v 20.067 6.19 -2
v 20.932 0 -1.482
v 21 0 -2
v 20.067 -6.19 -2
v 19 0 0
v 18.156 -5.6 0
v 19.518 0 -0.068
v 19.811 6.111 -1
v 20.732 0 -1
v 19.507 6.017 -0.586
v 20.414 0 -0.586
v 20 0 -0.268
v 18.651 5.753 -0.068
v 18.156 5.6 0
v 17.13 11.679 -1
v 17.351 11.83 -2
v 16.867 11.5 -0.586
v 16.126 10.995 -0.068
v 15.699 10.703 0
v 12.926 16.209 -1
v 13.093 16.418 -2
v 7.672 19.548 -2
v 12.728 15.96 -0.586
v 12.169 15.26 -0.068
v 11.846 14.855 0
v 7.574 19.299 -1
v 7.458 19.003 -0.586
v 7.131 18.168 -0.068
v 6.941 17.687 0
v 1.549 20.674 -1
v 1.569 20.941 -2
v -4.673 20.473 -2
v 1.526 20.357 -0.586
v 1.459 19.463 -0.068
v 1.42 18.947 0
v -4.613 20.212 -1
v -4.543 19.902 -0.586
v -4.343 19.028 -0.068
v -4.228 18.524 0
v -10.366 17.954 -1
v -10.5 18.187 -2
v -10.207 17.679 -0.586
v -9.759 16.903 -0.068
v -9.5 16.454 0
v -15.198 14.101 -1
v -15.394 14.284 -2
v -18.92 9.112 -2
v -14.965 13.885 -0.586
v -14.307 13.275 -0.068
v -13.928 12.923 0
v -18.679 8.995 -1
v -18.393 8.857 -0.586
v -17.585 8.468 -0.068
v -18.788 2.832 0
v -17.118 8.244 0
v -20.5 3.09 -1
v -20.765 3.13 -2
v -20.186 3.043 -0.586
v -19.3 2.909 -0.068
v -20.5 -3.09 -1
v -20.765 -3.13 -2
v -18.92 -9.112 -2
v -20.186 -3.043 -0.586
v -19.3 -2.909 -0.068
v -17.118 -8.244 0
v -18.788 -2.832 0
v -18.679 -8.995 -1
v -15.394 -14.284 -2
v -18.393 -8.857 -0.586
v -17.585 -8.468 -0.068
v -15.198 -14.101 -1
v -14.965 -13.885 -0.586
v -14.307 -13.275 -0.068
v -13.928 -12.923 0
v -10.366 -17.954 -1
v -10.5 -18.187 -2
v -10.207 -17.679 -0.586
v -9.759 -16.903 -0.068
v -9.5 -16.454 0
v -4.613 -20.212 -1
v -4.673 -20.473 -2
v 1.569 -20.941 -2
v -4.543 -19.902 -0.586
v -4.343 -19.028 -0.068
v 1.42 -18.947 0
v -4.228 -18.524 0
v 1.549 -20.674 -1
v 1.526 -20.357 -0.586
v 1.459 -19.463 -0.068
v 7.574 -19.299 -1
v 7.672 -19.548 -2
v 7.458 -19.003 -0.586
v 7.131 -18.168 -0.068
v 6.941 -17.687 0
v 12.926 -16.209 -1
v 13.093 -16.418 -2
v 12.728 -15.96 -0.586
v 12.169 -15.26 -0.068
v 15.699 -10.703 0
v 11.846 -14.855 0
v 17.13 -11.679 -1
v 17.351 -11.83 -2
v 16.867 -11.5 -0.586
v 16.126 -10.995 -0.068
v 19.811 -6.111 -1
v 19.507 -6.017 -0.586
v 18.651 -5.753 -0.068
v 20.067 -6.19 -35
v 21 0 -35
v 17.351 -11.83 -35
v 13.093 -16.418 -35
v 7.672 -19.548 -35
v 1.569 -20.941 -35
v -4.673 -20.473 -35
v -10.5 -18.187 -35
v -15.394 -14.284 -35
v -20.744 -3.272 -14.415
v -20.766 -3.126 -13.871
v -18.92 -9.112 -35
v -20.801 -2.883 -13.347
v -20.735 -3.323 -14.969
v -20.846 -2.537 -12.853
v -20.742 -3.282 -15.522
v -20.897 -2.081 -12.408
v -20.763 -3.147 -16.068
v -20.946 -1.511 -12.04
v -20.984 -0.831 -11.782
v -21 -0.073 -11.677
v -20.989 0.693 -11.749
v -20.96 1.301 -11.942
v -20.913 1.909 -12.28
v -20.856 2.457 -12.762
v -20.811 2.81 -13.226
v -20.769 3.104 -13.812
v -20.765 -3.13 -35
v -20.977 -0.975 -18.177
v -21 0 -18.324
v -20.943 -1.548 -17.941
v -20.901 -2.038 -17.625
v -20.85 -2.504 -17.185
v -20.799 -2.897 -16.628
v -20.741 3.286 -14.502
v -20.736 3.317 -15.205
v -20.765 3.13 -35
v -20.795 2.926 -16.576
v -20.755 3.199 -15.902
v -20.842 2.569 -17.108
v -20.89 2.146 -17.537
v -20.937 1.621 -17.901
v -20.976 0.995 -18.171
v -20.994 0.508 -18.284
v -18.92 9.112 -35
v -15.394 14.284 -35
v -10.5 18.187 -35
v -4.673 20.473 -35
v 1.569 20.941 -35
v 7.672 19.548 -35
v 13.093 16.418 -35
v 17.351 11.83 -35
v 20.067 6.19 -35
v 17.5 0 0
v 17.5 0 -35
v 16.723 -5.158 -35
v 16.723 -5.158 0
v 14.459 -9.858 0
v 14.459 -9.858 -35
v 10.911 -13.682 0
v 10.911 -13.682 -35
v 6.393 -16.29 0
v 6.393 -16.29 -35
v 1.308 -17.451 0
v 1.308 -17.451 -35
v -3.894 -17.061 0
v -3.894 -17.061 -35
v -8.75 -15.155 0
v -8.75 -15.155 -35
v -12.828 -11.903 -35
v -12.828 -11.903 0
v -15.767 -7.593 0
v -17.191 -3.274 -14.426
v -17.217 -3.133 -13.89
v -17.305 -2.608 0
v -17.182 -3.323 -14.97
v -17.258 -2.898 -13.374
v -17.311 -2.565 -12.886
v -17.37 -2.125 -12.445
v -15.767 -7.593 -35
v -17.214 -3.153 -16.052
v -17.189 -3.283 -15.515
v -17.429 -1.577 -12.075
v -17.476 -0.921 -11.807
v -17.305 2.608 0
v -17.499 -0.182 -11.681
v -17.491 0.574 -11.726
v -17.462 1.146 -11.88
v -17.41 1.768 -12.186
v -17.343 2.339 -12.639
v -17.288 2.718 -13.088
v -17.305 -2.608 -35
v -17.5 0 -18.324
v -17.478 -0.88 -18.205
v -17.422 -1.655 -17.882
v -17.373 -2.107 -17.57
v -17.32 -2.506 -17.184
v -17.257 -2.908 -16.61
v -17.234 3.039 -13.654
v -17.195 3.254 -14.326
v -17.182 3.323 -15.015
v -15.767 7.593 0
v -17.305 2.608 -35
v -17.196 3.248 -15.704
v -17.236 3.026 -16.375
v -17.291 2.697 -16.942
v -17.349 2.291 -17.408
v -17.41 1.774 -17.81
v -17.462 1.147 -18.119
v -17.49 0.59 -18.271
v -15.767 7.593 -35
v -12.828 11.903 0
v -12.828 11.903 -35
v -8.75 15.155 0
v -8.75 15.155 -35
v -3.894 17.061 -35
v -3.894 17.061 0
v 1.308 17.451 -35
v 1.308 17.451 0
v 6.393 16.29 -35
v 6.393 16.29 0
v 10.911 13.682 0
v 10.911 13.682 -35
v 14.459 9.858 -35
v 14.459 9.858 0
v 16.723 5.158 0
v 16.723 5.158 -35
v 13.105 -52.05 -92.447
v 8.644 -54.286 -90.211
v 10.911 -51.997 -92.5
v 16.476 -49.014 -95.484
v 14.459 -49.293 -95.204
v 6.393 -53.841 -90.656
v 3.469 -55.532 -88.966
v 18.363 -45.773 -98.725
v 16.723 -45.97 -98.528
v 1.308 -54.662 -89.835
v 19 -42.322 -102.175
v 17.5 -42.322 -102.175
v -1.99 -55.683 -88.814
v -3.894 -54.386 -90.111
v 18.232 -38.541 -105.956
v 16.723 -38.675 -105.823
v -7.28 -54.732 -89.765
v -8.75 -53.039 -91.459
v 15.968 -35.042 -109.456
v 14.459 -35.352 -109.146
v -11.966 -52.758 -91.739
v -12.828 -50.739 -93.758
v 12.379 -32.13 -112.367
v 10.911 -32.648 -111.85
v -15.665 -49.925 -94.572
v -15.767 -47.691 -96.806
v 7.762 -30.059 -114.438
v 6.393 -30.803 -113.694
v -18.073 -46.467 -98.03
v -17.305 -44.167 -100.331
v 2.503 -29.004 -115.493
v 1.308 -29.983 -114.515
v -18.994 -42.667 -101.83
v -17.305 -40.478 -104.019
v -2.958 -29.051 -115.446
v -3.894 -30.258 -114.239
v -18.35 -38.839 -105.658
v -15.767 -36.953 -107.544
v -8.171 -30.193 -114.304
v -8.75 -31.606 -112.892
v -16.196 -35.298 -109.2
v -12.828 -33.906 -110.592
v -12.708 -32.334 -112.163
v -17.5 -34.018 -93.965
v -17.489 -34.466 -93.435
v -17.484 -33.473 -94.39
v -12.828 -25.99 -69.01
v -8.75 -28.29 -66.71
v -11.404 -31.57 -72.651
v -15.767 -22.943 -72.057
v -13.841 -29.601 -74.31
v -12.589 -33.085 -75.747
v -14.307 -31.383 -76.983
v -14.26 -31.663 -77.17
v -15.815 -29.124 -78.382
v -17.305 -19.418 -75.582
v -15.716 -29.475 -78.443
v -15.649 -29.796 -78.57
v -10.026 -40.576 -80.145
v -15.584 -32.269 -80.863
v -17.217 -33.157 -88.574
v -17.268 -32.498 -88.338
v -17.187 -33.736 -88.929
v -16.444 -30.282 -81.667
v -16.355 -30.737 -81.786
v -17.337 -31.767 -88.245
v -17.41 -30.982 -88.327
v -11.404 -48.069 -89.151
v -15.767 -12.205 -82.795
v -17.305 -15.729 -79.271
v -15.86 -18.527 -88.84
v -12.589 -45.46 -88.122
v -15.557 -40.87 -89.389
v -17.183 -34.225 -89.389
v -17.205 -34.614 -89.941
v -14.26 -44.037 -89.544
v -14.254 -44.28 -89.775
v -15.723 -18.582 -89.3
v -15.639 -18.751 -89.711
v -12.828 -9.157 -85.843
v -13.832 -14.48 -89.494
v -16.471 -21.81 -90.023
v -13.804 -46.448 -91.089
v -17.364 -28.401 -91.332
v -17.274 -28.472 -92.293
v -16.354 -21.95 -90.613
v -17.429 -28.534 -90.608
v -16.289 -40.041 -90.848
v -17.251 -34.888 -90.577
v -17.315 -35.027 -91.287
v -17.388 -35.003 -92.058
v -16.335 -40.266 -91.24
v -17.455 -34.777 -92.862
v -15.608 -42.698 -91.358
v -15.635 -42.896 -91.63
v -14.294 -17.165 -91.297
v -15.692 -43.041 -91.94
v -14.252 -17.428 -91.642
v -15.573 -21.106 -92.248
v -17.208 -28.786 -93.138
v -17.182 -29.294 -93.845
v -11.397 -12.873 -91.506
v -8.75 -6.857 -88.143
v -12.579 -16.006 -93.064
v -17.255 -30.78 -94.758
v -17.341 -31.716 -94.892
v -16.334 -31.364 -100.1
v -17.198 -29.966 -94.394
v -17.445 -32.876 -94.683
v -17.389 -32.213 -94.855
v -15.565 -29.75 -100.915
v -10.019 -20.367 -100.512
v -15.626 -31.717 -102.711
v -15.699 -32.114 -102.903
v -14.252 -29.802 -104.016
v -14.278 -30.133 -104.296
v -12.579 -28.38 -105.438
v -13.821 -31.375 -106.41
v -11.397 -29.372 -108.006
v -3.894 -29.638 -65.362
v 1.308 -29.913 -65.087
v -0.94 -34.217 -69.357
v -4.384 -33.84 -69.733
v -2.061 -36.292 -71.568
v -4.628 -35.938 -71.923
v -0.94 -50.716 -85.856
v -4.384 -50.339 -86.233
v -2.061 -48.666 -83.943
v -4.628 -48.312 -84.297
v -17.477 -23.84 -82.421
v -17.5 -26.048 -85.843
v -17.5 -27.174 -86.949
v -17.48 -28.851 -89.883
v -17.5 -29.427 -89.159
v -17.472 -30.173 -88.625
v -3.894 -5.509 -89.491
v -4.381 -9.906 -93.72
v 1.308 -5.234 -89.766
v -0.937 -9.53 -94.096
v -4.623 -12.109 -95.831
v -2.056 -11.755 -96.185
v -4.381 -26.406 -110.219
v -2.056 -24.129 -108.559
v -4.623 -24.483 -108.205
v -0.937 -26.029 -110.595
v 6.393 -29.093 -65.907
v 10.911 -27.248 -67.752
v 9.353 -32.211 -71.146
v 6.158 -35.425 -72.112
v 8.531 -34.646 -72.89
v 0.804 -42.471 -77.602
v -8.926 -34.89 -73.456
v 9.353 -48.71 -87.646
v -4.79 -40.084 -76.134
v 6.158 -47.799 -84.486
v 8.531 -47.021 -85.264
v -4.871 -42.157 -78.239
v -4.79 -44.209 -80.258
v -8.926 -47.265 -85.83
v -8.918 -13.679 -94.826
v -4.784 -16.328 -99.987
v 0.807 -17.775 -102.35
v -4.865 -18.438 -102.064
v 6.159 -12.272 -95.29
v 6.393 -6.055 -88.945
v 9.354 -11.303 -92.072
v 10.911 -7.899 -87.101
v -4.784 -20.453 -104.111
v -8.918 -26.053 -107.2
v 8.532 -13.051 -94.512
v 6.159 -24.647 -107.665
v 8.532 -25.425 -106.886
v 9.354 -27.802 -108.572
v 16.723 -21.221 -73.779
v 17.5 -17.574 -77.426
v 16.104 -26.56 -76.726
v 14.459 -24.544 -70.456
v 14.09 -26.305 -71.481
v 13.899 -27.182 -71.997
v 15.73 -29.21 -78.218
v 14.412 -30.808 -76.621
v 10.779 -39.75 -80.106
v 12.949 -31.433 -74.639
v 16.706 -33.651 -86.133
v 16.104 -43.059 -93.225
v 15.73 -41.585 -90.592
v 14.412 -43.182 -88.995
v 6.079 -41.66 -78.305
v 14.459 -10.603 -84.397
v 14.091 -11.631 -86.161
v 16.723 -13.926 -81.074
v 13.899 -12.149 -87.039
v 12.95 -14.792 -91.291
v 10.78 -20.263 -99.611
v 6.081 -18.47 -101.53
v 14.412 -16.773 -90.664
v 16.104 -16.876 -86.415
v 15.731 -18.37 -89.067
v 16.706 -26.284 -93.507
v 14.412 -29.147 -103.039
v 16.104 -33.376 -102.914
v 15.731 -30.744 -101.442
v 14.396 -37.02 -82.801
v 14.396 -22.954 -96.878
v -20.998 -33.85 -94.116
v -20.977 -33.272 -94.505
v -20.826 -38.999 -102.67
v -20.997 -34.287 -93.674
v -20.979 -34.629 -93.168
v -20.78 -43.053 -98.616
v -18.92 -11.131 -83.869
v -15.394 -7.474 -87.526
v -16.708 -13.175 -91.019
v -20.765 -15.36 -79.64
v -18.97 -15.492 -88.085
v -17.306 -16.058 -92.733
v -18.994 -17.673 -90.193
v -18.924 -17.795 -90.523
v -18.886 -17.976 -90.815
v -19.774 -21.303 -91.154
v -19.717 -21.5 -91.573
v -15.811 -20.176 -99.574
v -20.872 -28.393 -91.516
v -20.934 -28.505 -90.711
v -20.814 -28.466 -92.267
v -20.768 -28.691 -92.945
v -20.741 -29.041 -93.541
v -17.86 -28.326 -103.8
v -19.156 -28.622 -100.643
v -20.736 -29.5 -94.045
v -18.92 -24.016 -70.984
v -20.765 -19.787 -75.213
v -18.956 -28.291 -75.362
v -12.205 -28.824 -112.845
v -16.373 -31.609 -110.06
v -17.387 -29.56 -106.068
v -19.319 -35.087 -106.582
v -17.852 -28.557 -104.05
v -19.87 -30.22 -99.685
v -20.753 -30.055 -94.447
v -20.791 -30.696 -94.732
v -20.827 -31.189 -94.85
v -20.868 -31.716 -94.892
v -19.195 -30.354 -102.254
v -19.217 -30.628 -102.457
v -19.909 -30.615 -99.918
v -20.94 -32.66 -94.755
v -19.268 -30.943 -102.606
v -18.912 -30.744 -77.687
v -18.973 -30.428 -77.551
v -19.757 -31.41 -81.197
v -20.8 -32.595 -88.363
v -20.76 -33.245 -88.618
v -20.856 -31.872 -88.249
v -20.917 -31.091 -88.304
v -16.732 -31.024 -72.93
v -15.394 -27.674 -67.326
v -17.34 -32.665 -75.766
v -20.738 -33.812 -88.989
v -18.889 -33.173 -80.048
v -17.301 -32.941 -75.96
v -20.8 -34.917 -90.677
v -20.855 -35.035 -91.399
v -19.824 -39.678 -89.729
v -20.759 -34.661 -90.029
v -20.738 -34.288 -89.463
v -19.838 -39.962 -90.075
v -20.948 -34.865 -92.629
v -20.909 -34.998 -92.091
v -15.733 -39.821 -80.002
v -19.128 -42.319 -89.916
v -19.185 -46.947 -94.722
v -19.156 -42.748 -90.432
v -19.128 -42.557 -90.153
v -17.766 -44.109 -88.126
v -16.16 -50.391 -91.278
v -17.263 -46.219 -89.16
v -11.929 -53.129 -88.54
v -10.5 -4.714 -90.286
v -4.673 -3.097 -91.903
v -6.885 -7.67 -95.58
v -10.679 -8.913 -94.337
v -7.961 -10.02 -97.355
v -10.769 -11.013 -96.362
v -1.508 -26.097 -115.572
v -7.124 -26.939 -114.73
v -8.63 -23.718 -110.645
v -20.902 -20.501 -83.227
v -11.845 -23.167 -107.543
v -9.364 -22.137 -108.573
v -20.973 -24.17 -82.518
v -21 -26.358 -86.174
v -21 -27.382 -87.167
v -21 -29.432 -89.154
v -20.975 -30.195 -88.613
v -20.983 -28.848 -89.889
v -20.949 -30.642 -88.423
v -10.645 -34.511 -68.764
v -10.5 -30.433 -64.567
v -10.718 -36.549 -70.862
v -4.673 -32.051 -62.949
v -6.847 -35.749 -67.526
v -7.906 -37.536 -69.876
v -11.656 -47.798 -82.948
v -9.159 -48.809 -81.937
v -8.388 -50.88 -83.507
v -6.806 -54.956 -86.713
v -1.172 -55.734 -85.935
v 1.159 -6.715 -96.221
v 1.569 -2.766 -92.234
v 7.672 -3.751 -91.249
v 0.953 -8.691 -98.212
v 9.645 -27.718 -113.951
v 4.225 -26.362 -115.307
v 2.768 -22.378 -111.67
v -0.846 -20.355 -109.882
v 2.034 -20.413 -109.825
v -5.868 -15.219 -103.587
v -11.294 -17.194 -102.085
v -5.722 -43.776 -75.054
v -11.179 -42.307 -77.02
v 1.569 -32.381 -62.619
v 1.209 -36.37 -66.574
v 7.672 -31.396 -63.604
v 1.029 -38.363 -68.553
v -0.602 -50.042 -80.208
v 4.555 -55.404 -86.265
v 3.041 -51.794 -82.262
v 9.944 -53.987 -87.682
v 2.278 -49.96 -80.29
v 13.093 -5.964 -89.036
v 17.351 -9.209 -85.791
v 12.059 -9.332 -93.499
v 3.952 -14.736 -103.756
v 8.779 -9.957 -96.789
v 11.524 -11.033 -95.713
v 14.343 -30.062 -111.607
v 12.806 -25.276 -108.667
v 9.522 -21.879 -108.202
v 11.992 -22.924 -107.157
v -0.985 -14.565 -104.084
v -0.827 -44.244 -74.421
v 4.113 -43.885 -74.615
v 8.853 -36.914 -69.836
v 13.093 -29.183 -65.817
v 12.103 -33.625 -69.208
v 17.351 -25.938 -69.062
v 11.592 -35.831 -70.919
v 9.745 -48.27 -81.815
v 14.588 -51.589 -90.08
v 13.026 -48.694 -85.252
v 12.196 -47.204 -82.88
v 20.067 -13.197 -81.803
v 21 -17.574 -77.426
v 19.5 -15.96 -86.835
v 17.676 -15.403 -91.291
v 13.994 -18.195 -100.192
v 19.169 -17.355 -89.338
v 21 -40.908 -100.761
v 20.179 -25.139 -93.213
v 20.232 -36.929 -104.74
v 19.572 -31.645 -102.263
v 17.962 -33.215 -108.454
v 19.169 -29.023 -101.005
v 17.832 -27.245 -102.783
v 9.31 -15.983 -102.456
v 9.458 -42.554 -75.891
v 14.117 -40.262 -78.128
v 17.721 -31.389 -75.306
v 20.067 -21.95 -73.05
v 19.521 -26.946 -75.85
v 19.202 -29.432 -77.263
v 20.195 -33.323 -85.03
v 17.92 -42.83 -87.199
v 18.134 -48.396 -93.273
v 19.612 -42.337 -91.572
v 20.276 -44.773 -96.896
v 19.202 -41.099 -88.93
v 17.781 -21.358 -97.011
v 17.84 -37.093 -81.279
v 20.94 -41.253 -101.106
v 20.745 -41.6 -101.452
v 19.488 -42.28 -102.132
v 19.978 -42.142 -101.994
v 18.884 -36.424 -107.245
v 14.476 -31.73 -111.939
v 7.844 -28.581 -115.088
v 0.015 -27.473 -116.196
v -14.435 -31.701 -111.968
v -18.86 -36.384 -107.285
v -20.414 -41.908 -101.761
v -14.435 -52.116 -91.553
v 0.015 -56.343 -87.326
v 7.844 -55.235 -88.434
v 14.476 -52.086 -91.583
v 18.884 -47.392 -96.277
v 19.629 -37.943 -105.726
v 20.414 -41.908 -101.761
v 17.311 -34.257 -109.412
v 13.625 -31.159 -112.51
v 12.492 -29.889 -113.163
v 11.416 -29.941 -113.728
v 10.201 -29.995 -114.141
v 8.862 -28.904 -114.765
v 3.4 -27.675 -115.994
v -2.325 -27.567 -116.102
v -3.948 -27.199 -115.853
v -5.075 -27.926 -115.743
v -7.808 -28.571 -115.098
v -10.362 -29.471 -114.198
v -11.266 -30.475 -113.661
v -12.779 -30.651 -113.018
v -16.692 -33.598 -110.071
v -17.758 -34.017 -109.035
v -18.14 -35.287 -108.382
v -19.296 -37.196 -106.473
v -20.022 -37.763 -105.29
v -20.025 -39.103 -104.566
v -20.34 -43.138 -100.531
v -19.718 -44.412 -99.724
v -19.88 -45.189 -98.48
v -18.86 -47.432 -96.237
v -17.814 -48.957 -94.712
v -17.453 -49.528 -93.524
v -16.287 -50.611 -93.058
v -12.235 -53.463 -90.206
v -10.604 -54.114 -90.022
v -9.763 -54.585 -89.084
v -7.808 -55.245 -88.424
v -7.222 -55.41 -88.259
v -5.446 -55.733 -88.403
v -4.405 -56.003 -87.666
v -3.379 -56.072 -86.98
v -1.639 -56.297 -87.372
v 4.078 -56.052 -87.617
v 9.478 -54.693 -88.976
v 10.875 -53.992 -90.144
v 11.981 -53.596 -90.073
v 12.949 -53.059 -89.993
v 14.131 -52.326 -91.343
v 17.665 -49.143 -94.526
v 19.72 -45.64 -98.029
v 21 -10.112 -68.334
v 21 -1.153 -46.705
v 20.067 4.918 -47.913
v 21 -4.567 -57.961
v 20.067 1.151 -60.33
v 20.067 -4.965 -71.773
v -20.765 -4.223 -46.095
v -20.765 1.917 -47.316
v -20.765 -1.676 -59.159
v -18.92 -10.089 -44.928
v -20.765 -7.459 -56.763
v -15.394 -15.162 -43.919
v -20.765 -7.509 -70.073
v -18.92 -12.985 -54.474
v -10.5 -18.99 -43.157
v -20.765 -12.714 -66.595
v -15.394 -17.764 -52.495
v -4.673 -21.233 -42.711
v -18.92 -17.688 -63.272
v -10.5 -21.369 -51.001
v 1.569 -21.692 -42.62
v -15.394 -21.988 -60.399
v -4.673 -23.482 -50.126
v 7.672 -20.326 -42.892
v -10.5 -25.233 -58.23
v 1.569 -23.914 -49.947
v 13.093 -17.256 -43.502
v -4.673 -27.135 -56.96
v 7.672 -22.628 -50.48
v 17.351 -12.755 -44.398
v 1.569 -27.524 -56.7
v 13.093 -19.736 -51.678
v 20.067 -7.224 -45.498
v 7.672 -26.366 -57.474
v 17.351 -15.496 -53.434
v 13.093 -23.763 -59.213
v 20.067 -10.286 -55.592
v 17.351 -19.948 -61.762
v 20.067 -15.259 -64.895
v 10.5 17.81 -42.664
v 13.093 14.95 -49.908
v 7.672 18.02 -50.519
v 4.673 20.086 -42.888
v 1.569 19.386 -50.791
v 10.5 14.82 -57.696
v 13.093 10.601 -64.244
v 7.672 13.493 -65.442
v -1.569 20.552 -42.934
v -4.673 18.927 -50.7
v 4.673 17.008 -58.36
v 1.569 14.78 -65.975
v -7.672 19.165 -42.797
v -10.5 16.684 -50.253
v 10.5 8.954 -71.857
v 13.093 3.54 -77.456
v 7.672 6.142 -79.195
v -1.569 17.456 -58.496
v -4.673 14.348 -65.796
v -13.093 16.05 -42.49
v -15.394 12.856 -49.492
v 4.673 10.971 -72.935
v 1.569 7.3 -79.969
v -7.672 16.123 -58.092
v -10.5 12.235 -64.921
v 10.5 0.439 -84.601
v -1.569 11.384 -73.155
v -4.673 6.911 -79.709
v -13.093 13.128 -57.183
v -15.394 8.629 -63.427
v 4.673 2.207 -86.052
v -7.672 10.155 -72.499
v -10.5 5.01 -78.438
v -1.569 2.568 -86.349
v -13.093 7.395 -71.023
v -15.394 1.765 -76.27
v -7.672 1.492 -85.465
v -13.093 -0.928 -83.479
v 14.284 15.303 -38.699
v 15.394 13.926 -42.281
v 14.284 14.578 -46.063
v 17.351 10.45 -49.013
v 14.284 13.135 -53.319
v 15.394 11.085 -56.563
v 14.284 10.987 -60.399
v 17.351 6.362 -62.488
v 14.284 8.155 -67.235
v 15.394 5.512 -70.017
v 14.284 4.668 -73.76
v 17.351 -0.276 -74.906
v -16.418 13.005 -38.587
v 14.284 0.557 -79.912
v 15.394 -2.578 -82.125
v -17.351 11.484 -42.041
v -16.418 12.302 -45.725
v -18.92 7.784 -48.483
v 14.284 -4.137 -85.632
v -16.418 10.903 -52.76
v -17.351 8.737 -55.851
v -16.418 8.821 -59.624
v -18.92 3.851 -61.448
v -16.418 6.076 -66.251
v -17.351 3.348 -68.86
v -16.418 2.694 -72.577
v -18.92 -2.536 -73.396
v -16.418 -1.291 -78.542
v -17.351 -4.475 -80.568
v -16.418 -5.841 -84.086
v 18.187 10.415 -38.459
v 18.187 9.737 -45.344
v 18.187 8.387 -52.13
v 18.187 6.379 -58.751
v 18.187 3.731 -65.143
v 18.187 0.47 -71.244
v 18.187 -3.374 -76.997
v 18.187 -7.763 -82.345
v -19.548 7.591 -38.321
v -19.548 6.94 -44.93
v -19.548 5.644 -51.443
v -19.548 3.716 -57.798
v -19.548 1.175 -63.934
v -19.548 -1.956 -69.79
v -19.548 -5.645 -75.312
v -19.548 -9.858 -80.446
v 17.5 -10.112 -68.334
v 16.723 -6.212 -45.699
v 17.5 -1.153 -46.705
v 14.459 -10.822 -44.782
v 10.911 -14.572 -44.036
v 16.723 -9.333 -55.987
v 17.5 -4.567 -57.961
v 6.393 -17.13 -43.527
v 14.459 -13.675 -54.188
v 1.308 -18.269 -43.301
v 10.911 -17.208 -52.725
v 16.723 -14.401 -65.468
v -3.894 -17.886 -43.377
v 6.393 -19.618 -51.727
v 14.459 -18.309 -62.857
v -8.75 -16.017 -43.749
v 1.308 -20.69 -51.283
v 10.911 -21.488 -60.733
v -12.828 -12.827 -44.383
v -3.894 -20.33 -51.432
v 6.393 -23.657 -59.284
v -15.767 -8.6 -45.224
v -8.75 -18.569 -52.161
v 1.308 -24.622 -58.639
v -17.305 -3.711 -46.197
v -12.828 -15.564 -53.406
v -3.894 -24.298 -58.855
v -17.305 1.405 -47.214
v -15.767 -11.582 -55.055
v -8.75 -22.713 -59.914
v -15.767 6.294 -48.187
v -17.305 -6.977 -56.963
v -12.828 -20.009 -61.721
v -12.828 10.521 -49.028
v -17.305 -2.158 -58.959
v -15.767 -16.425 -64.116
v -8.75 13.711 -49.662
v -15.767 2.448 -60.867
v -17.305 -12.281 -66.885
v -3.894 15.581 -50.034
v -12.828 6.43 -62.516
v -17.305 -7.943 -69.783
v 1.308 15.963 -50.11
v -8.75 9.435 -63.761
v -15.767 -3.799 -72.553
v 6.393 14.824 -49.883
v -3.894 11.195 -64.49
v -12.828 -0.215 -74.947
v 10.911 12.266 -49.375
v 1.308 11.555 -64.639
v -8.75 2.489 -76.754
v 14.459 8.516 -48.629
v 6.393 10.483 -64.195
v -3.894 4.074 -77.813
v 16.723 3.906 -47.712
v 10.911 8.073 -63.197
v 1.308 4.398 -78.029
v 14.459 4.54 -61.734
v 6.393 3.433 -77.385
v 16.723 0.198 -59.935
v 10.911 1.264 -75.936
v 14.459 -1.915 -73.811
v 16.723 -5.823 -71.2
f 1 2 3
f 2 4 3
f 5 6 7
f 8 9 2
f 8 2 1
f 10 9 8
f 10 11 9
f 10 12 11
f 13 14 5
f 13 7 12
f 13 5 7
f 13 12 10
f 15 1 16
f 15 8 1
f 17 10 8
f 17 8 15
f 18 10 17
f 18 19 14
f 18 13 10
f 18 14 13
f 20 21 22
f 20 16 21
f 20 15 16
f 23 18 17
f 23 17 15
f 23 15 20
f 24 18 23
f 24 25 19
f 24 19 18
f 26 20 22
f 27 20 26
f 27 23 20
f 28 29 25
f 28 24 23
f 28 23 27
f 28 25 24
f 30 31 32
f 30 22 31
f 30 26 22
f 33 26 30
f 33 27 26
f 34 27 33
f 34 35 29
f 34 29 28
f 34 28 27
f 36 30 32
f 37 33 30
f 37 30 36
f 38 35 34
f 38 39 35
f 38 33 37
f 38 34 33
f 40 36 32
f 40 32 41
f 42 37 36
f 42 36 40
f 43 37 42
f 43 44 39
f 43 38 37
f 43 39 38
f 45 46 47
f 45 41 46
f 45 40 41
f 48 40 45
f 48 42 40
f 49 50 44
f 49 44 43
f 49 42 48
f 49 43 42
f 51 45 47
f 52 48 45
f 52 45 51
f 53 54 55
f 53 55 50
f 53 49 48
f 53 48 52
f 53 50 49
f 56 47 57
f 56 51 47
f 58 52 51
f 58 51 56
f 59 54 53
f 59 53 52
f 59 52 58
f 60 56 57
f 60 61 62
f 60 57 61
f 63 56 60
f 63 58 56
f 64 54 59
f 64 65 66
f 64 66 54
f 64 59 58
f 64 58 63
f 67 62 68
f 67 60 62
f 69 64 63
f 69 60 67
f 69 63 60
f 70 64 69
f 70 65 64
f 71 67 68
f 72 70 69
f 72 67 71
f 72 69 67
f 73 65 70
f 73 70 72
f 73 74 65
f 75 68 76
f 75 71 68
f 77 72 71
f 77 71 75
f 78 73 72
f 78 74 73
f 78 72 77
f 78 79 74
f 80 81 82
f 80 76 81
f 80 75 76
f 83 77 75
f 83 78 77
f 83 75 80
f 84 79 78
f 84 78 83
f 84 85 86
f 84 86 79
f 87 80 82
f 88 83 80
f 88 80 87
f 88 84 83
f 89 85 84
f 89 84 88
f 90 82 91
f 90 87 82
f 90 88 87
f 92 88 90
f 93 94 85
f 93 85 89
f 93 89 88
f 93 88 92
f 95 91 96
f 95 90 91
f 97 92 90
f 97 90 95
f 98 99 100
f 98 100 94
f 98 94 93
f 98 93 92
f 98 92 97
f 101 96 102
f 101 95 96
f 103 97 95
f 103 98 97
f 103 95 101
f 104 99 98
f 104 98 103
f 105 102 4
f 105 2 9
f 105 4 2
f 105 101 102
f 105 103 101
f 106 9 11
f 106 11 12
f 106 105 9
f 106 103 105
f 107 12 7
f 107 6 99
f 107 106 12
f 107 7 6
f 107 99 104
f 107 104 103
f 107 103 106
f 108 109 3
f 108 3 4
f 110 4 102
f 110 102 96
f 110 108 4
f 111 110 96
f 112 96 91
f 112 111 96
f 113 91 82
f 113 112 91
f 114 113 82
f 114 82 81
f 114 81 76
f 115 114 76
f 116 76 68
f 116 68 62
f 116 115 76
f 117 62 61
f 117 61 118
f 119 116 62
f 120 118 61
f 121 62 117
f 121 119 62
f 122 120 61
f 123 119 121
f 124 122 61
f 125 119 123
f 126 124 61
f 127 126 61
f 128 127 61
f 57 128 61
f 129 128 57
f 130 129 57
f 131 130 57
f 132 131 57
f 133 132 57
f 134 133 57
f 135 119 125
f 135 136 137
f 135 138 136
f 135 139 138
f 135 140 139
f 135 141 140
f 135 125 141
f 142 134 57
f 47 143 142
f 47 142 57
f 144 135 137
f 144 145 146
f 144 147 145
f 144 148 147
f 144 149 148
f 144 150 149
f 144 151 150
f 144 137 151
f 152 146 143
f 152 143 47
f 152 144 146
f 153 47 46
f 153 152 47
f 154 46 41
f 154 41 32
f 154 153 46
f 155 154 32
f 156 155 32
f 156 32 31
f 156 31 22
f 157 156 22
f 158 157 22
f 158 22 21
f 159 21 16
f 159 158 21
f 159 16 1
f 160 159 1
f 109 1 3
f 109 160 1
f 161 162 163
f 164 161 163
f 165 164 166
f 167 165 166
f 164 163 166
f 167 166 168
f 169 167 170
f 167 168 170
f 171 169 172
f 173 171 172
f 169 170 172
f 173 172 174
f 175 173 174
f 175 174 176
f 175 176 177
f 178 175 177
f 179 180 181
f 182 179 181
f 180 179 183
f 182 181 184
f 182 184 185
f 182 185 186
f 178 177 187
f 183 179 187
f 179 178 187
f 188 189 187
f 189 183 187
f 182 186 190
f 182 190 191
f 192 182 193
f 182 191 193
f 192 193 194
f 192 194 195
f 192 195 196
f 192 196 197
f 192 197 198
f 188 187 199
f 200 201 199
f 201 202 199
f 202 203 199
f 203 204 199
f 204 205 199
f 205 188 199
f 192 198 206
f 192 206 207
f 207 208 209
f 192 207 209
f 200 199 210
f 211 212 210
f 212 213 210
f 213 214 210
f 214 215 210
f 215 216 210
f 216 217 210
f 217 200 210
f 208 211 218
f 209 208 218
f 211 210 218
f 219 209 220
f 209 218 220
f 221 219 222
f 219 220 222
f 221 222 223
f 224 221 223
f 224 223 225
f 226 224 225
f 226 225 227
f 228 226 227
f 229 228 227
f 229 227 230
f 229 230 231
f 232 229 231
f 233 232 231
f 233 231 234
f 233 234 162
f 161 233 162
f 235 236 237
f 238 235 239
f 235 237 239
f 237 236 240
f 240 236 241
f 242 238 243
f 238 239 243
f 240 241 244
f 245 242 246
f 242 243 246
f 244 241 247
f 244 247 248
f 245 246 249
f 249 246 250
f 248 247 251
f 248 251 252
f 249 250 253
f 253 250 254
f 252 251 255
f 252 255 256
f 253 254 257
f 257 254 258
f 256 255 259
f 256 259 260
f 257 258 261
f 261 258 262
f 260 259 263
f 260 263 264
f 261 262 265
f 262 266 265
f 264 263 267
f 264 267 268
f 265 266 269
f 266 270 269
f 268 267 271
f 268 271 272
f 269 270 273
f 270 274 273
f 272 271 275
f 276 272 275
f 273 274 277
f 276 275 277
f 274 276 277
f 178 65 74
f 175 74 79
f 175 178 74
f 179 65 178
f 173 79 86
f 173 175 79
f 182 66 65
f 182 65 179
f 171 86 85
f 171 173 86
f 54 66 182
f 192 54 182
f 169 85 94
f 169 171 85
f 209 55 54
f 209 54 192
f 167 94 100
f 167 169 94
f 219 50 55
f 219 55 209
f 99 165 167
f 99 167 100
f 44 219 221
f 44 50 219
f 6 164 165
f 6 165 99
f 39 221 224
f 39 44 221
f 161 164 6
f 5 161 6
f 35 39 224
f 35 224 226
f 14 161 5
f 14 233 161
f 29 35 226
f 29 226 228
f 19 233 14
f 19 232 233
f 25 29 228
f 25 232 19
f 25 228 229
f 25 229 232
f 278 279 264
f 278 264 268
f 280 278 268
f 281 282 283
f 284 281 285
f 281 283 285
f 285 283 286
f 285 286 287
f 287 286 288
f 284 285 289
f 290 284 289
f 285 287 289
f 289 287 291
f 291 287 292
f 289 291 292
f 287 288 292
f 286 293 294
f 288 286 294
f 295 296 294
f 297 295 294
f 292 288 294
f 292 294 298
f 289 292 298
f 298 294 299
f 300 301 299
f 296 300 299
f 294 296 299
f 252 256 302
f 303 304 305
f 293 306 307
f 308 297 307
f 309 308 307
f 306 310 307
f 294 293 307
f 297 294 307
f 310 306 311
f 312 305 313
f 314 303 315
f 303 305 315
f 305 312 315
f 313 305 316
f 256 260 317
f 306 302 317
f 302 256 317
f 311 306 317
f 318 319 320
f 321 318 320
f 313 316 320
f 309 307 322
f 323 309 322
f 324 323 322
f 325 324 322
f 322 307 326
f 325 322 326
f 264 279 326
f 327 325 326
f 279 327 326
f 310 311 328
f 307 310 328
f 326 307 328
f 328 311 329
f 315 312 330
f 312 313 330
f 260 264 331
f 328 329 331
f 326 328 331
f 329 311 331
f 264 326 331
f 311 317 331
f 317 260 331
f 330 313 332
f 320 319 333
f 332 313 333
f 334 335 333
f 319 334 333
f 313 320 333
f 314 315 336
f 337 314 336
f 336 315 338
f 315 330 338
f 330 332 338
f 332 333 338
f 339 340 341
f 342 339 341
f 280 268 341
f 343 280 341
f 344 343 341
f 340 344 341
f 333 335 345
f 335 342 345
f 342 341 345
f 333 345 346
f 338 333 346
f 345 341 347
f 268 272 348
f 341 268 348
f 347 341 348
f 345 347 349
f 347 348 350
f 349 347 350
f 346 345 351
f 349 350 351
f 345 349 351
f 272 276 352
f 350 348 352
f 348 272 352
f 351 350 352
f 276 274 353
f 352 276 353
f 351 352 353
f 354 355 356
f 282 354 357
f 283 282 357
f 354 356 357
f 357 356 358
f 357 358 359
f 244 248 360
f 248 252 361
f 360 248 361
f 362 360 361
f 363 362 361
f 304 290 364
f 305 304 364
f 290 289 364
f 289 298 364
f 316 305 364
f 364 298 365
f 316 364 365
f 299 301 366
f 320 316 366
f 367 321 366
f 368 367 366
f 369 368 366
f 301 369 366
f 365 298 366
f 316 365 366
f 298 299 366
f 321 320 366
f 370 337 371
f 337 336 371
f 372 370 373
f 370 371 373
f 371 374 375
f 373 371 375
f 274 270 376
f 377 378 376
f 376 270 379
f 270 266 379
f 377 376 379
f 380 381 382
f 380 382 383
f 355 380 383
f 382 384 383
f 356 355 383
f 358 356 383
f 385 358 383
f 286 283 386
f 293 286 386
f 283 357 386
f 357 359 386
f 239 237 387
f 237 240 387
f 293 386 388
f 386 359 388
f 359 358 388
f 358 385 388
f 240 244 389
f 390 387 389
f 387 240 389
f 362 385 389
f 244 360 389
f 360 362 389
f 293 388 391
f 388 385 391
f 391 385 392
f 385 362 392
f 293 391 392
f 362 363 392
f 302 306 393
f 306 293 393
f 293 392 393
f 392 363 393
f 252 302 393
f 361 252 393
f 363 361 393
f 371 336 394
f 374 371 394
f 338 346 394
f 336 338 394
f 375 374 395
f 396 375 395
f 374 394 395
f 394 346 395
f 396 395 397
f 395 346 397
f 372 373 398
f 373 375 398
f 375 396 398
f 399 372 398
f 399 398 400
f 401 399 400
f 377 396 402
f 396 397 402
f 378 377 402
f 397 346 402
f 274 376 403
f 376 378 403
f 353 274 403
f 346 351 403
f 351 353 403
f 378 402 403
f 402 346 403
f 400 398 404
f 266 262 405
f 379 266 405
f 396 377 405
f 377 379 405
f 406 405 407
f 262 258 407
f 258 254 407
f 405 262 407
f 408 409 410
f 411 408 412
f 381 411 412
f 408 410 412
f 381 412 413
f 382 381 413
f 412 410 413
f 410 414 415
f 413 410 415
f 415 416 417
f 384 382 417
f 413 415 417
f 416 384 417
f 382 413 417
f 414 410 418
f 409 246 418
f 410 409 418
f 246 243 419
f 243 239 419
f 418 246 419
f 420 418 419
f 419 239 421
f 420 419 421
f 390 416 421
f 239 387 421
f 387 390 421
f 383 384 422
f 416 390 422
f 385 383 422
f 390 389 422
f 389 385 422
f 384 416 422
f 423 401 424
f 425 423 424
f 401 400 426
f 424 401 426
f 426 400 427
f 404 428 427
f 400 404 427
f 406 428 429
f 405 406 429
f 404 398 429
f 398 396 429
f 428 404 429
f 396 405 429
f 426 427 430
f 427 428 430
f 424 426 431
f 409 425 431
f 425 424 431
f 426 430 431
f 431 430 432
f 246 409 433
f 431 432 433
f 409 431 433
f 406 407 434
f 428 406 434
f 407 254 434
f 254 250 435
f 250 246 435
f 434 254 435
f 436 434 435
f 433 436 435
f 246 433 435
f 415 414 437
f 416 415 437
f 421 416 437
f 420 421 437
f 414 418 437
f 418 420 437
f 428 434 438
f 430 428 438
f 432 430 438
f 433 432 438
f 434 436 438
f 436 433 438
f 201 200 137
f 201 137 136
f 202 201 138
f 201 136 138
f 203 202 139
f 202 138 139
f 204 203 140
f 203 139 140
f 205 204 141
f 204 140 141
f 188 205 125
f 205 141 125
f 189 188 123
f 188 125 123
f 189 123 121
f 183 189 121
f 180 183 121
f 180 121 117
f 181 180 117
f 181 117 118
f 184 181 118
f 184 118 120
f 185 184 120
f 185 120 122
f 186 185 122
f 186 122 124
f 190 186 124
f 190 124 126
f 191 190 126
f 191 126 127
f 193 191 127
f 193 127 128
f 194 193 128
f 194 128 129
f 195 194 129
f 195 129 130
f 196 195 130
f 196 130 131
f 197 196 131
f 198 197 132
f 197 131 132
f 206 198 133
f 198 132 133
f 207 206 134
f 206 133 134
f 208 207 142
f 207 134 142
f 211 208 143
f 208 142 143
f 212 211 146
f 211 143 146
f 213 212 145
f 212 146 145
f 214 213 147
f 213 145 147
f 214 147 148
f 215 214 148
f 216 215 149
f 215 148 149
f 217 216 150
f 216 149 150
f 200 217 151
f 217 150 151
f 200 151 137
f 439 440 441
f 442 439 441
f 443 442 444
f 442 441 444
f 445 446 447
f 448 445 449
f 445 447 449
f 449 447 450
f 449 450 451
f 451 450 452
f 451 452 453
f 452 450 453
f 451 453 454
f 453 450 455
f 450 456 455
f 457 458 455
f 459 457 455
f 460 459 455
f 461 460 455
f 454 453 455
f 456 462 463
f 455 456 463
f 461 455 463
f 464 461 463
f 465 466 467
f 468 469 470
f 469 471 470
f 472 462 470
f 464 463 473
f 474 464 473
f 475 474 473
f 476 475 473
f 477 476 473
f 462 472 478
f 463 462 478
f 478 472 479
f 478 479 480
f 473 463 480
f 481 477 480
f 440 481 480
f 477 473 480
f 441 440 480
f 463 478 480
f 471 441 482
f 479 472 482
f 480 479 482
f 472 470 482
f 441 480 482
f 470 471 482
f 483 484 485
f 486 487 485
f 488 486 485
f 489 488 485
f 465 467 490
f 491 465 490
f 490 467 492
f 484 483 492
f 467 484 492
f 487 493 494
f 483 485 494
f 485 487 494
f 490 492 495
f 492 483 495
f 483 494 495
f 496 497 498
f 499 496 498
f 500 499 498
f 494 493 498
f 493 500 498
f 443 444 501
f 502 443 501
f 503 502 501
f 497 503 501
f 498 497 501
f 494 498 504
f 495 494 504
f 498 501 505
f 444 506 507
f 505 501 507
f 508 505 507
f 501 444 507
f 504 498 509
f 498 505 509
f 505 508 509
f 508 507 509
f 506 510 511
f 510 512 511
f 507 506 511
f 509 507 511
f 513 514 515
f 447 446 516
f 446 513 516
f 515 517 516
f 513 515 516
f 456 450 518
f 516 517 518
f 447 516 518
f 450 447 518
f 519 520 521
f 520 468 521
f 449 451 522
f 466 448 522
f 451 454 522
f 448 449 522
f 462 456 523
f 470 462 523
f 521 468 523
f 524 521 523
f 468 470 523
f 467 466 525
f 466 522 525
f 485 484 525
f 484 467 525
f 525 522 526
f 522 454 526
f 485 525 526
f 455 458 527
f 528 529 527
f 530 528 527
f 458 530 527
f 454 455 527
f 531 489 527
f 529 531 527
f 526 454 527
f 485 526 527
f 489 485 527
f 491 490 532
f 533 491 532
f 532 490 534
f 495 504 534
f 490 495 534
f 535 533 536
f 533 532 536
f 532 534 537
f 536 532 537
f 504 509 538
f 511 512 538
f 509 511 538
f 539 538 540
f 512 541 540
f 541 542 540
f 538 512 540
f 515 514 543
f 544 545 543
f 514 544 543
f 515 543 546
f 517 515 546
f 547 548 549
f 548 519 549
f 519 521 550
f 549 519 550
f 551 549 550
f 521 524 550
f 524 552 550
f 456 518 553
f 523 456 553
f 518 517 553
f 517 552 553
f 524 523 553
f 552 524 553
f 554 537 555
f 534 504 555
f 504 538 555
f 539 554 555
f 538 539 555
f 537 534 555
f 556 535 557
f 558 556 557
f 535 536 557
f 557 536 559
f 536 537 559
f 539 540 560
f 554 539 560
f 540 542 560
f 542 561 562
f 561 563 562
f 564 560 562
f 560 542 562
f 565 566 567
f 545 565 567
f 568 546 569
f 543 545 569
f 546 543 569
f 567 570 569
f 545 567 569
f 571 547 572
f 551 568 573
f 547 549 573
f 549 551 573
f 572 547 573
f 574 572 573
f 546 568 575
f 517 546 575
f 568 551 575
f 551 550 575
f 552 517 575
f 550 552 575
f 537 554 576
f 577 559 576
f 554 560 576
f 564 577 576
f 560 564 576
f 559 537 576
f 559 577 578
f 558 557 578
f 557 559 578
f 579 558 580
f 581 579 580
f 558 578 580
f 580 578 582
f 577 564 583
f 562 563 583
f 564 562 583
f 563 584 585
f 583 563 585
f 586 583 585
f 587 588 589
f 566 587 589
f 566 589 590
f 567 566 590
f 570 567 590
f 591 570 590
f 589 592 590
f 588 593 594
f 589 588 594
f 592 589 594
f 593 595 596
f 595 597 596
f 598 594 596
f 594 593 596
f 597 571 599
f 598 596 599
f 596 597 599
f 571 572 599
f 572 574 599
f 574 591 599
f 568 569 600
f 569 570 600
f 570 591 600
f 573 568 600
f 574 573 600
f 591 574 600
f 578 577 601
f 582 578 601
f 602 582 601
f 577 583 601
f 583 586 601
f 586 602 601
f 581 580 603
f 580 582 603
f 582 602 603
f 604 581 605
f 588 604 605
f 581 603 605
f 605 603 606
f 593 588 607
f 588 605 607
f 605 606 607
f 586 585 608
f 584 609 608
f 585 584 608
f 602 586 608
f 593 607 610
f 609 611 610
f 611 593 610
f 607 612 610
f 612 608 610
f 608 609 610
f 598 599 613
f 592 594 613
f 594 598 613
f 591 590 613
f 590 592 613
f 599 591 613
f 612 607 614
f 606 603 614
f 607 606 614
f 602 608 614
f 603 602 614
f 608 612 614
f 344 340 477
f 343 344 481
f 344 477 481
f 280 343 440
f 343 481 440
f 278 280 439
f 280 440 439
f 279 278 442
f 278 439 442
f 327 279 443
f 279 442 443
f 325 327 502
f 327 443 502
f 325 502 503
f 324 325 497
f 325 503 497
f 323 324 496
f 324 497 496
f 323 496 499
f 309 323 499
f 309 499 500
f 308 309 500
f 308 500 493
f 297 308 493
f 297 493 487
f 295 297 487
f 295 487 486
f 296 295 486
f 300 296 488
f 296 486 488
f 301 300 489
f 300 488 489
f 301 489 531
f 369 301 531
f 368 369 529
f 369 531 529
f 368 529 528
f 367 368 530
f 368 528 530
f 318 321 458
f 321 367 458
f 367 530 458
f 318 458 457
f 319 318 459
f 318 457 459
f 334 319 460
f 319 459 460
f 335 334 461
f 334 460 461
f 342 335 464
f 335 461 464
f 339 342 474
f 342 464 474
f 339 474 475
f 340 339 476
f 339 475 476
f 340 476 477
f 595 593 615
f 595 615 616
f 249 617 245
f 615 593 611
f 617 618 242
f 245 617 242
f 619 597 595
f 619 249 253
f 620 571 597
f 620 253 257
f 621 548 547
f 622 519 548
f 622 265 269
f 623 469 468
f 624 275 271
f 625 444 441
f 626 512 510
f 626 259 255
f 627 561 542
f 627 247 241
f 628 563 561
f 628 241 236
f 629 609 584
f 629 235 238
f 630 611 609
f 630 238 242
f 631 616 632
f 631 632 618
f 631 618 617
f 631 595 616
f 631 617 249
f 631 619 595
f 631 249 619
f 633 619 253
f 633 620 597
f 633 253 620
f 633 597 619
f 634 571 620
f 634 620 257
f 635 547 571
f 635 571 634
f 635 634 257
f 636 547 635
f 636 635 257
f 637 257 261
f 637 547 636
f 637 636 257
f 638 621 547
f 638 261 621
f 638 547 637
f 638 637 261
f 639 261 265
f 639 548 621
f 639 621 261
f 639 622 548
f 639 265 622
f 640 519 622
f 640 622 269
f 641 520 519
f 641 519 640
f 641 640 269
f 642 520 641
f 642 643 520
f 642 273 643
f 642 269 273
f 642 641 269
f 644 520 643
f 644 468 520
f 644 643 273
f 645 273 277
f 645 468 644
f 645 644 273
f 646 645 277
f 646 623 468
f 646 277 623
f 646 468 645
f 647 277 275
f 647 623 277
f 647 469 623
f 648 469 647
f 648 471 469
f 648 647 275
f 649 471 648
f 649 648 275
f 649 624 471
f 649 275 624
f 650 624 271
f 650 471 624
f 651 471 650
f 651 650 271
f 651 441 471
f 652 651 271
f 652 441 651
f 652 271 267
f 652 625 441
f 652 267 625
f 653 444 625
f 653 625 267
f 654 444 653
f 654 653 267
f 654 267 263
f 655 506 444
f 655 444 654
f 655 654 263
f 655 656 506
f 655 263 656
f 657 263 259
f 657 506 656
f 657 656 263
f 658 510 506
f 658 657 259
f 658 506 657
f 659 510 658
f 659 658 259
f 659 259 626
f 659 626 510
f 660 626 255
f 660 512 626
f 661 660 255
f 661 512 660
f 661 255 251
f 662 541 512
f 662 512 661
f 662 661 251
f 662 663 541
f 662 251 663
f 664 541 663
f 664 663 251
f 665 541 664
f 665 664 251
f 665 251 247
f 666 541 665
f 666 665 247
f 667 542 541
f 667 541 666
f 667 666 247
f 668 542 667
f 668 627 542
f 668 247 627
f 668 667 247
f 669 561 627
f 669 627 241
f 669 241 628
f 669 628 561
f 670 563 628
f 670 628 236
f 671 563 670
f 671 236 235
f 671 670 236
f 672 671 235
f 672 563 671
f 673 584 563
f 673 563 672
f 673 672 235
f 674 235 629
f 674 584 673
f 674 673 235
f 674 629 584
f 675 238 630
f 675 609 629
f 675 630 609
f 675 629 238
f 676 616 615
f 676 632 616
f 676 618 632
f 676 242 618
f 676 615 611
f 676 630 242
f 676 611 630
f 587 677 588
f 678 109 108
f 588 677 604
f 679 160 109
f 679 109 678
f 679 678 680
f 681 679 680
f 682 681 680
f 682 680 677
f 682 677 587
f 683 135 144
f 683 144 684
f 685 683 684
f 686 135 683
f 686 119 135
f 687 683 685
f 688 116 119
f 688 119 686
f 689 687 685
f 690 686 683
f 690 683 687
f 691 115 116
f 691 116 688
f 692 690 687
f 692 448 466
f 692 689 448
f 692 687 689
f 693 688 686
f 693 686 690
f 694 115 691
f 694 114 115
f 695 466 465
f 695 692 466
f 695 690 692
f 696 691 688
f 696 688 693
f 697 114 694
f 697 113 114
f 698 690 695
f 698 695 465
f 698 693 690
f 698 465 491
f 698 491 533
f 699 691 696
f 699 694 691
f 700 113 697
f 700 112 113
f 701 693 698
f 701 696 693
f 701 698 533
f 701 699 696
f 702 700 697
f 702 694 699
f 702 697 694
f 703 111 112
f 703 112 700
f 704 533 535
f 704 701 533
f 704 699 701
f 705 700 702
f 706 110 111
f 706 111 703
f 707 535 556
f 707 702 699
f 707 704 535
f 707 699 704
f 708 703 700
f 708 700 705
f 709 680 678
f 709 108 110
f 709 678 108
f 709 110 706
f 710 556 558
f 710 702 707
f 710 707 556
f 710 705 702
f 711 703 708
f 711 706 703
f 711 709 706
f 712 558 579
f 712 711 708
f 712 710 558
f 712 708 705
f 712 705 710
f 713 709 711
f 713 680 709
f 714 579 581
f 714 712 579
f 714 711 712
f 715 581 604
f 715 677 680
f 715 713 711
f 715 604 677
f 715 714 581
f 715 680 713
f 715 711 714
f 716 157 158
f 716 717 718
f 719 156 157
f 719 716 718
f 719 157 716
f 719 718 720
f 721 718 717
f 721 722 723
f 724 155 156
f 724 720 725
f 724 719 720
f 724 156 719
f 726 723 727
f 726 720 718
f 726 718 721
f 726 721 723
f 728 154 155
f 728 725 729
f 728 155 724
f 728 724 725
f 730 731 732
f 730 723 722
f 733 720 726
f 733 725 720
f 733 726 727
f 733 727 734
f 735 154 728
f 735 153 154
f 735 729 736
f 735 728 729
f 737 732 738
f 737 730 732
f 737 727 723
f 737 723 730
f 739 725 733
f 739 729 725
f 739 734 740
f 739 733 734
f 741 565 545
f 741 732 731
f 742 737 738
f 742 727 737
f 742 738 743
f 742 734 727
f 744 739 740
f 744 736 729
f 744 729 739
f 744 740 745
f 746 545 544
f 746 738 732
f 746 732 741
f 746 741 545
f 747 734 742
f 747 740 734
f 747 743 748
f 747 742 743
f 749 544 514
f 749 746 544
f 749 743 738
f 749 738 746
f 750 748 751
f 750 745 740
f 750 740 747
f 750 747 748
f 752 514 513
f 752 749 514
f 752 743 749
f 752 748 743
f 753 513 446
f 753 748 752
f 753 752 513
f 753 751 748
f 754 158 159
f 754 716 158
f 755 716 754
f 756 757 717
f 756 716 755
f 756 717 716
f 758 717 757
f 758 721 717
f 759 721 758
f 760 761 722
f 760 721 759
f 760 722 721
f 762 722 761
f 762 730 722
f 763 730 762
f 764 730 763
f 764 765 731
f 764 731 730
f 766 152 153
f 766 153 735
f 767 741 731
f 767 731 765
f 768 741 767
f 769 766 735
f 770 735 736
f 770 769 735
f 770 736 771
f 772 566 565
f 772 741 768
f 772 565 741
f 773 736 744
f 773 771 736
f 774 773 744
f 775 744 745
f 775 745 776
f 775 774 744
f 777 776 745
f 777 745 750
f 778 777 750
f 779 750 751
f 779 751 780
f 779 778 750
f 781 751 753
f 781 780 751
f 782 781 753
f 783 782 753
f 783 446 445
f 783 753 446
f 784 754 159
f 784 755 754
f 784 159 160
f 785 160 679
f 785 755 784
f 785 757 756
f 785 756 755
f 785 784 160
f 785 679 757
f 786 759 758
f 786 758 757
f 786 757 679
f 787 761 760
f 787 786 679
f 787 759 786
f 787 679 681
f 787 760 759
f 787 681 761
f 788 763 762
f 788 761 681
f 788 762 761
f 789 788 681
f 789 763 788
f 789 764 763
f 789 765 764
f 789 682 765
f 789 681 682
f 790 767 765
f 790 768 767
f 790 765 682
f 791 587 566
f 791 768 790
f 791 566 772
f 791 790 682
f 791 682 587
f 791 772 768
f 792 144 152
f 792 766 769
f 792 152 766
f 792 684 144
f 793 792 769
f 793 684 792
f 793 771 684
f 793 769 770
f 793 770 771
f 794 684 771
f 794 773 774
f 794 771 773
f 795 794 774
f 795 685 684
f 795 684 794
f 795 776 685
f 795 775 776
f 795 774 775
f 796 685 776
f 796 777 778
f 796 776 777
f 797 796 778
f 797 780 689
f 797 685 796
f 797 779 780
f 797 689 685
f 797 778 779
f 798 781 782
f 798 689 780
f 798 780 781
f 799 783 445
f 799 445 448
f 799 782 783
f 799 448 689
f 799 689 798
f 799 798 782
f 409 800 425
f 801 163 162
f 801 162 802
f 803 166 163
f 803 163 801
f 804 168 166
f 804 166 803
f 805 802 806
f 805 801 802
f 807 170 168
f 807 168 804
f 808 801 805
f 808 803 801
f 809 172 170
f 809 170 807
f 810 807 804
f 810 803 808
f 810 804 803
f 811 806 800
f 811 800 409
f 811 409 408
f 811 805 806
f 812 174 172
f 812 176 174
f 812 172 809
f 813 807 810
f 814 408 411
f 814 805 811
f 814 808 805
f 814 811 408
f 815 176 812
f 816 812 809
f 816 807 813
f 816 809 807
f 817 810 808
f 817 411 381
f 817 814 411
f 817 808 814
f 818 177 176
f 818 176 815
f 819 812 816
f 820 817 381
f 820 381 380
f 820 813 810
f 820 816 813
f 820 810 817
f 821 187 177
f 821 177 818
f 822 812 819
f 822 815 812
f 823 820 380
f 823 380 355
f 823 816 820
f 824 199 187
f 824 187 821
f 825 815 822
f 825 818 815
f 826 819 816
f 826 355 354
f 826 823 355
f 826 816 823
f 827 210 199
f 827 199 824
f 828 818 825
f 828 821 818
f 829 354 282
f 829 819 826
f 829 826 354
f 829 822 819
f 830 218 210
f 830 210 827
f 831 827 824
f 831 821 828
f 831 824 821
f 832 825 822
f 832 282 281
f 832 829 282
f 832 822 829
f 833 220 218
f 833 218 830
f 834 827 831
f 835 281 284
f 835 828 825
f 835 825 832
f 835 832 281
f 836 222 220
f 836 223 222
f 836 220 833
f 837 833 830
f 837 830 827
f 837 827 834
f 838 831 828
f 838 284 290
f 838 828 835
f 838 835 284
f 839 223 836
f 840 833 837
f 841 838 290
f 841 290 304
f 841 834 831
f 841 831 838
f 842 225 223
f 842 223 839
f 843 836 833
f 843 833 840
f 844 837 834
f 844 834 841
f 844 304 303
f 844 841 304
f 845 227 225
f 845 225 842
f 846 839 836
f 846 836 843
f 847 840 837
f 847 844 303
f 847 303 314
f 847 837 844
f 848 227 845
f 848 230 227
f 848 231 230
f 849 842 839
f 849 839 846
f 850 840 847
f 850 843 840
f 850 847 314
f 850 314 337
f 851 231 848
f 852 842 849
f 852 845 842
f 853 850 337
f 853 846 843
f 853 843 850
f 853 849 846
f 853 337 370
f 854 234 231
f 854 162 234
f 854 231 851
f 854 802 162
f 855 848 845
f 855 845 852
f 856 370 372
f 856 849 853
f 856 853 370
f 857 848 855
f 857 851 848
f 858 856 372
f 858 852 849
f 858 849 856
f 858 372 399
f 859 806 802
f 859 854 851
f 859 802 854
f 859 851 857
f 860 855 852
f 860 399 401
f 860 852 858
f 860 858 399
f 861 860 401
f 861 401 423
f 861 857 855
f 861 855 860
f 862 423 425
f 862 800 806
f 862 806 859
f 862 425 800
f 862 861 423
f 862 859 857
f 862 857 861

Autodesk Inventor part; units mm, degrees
ref_plane "YZ Plane" through (0, 0, 0) normal (1, 0, 0) x (0, 1, 0)
ref_plane "XZ Plane" through (0, 0, 0) normal (0, 1, 0) x (-1, 0, 0)
ref_plane "XY Plane" through (0, 0, 0) normal (0, 0, 1) x (1, 0, 0)
sketch "Sketch3" plane through (0, 0, 0) normal (1, 0, 0) x (0, 1, 0)
  line L0 (0, 0) -> (0, -35)
  line L1 (-17.5736, -77.4264) -> (-42.3223, -102.1751)
  arc A0 (-17.5736, -77.4264) -> (0, -35) centre (-60, -35) ccw
  point P0 (0, -59.8528)
  point P1 (0, -15)
  point P2 (-31.7157, -91.5685)
  dimension "d34" = 59.8528
  dimension "d36" = 135
  dimension "d37" = 60
  dimension "d40" = 15
  dimension "d41" = 15
  dimension "d50" = 35
sketch "Sketch1" plane through (0, 0, 0) normal (0, 0, 1) x (1, 0, 0)
  circle A0 centre (0, 0) radius 17.5
  circle A1 centre (0, 0) radius 21
  dimension "d1" = 42
  dimension "d2" = 35
sweep "Sweep1" add profiles "Sketch1" path "Sketch3"
hole "Hole3" at (0, 0, -15) at (0, -31.7157, -91.5685) direction (-1, 0, 0) diameter 6.647 end through all
fillet "Fillet3" radius 2 2 edges at (-21, 0, 0) (-21, -42.3223, -102.1751)
properties part number "55-6" material "Iron, Cast"
